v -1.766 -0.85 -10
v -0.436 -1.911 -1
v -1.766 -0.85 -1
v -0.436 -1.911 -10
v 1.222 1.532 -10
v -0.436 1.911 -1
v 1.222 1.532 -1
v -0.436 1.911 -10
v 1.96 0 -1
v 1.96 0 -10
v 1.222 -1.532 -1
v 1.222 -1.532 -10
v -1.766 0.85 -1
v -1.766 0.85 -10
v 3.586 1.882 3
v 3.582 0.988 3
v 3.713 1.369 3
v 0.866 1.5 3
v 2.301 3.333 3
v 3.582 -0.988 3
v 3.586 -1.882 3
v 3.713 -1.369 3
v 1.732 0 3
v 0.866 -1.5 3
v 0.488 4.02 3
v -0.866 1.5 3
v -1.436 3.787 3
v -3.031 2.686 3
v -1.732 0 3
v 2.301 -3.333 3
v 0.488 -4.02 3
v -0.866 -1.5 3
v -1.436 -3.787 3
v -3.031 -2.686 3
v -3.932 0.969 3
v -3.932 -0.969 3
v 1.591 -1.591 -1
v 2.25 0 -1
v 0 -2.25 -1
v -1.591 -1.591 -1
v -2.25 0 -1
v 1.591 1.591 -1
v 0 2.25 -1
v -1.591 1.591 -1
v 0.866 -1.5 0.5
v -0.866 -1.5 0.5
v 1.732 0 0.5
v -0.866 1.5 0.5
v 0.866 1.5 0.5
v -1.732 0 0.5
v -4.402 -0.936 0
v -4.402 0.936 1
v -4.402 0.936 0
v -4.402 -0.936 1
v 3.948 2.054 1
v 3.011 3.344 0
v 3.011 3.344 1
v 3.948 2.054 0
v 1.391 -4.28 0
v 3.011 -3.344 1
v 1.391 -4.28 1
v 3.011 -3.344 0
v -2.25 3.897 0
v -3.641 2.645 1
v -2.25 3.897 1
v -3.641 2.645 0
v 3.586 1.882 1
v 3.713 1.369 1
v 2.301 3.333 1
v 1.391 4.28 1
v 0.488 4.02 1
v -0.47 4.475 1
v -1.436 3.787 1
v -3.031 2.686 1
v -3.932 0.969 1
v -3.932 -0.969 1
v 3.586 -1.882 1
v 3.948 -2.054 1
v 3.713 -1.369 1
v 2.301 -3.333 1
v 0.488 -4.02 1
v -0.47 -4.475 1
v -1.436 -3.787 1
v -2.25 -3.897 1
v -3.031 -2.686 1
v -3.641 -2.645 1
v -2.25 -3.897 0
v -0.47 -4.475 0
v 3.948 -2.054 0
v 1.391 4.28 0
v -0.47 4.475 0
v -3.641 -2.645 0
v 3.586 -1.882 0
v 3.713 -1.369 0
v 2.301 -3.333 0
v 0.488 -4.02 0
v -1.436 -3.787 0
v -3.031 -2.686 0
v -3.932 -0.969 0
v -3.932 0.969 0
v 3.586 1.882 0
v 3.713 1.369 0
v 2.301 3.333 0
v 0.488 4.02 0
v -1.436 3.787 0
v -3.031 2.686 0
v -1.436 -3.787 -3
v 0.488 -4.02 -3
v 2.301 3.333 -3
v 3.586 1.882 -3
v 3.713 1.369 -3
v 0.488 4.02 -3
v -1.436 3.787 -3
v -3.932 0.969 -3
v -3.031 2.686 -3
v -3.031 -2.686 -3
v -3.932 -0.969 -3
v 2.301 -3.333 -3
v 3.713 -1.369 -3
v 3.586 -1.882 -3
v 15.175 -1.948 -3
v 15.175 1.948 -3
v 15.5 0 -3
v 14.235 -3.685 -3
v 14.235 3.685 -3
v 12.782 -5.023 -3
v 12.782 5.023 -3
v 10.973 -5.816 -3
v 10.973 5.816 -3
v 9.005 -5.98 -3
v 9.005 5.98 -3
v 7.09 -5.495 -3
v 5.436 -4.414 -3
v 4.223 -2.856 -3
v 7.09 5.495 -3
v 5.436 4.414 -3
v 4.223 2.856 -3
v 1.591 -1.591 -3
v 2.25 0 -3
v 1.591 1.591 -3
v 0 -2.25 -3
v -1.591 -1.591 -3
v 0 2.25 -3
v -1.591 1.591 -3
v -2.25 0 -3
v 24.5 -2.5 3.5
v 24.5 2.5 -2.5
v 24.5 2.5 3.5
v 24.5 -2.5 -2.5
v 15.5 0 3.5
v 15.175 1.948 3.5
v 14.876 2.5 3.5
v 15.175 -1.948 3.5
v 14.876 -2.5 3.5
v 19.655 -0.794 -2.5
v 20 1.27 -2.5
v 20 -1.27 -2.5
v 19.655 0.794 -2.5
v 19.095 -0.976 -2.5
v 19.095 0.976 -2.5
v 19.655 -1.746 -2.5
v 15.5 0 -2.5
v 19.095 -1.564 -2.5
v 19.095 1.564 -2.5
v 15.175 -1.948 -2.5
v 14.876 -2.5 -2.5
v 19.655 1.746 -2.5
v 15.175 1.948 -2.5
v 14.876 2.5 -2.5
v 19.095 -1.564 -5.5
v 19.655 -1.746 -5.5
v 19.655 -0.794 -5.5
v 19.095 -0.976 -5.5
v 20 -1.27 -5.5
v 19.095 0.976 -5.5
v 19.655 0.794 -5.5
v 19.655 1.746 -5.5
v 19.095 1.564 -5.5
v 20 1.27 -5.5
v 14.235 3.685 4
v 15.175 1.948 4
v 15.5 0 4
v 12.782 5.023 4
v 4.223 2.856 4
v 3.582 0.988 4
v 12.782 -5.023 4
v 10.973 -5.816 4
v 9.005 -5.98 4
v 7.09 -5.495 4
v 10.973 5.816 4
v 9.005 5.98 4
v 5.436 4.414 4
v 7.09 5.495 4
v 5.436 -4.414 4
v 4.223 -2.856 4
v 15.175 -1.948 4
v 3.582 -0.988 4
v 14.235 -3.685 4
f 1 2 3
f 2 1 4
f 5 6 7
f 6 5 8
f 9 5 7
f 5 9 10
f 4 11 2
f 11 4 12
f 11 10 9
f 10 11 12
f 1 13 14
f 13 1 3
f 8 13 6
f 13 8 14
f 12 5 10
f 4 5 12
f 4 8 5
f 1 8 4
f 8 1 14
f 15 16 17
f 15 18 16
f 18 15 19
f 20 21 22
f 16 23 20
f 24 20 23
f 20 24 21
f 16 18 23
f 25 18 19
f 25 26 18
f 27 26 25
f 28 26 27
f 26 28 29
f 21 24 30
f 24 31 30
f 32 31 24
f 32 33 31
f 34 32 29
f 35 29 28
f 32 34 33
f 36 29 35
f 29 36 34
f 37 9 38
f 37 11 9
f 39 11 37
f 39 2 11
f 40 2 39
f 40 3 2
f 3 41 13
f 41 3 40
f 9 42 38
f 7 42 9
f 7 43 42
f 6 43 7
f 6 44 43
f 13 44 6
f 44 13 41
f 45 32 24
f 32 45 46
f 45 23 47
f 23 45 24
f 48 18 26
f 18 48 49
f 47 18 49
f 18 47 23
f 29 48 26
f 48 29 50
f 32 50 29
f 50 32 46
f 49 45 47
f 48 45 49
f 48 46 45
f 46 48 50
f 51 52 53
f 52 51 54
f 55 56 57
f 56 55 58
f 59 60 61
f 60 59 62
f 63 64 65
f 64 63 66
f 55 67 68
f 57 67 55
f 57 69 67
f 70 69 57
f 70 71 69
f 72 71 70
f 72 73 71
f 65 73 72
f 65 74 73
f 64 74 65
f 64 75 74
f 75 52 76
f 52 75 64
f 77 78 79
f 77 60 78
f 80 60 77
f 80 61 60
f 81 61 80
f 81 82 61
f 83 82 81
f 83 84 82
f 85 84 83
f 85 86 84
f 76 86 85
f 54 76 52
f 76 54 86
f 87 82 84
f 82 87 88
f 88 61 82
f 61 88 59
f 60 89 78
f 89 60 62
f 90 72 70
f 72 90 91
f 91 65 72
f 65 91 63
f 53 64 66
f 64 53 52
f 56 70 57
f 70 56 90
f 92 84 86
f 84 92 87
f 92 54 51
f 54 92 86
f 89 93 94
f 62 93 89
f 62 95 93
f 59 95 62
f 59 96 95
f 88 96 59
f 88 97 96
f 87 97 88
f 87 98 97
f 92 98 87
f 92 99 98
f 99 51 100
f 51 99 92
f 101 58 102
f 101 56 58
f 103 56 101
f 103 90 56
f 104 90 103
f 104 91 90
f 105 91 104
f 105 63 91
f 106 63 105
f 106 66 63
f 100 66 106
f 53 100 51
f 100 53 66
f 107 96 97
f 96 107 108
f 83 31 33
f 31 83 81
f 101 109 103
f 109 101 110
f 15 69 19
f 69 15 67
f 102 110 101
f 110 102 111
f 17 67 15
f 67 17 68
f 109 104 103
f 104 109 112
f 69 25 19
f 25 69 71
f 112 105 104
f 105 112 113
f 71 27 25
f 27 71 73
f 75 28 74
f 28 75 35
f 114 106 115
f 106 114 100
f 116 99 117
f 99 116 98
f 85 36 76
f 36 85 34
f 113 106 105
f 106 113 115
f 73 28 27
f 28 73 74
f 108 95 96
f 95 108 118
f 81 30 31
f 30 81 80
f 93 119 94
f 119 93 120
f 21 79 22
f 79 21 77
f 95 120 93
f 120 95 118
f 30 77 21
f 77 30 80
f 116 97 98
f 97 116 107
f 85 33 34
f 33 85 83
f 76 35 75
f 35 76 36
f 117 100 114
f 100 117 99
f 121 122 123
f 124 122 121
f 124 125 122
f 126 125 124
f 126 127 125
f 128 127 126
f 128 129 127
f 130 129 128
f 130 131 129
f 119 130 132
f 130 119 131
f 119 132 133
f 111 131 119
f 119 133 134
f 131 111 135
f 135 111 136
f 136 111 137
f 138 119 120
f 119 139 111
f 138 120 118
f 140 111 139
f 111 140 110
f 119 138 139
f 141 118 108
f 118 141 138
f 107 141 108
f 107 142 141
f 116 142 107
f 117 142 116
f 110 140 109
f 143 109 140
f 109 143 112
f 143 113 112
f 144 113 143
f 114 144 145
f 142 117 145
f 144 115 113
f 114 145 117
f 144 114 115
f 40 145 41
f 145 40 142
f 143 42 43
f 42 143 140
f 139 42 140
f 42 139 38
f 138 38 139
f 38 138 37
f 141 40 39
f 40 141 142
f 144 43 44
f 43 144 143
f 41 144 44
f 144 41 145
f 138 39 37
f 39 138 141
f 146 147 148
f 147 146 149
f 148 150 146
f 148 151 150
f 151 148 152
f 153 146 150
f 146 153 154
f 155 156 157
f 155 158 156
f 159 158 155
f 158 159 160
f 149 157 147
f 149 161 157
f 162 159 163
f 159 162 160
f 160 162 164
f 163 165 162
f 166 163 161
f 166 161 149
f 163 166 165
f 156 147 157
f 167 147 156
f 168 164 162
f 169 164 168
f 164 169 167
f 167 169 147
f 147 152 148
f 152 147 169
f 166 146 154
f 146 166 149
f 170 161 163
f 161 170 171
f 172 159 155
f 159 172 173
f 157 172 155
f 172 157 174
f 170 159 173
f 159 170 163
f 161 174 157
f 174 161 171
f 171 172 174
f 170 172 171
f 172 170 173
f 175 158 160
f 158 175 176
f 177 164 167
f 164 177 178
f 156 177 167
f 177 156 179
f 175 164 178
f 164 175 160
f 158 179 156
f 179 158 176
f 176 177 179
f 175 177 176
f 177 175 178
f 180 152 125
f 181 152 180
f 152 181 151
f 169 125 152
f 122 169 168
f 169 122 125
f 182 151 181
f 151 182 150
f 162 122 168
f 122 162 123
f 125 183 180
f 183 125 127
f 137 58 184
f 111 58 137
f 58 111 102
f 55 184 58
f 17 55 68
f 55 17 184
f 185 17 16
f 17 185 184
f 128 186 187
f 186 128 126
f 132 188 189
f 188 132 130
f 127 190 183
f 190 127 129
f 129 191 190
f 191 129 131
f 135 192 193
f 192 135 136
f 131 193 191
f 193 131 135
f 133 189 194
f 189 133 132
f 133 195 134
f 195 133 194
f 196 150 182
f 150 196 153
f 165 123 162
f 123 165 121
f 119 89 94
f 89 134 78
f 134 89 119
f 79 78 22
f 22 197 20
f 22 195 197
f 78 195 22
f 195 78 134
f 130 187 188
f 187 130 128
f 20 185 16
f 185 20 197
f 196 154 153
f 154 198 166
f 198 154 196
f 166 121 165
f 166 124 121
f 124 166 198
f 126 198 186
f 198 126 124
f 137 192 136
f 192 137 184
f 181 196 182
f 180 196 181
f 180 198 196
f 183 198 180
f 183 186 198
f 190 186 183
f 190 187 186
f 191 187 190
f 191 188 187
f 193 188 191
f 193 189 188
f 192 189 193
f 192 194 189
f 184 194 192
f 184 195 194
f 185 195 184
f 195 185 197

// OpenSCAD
// Parameters
shank_diameter_mm = 4; //[2:8:0.1]
length_under_head_mm = 10; //[5:20:0.5]
head_diameter_mm = 7; //[3.5:14:0.1]
head_height_mm = 4; //[2:8:0.1]
hex_socket_af_mm = 3; //[1.5:6:0.1]
hex_socket_depth_mm = 2.5; //[1:4:0.1]
thread_representation_diameter_factor = 0.98; //[0.9:1:0.01]
washer_outer_diameter_mm = 9; //[4.5:18:0.1]
washer_thickness_mm = 1; //[0.5:2:0.1]
pcb_spacer_height_mm = 6; //[3:12:0.5]
pcb_spacer_wall_mm = 1.8; //[0.9:3.6:0.1]
screw_clearance_diameter_mm = 4.5; //[4.1:5.5:0.1]
buzzer_body_diameter_mm = 12; //[6:24:0.5]
buzzer_body_height_mm = 7; //[3.5:14:0.5]
pin_socket_body_width_mm = 10; //[5:20:0.5]
pin_socket_body_depth_mm = 5; //[2.5:10:0.5]
pin_socket_body_height_mm = 6; //[3:12:0.5]
pin_socket_pin_diameter_mm = 1; //[0.5:2:0.1]
pin_socket_pin_length_mm = 4; //[2:8:0.5]
pin_socket_pin_spacing_mm = 2.54; //[2:5.08:0.01]
overlap_mm = 1; //[0.5:2:0.1]

// PCB Spacer - complete geometry
module pcb_spacer() {
  color("Silver") {
    difference() {
      cylinder(r=screw_clearance_diameter_mm/2 + pcb_spacer_wall_mm, h=pcb_spacer_height_mm, center=true);
      translate([0, 0, -overlap_mm])
        cylinder(r=screw_clearance_diameter_mm/2, h=pcb_spacer_height_mm + 2*overlap_mm, center=true);
    }
  }
}

// Screw and Washer - complete geometry
module screw_and_washer() {
  color("DimGray") {
    union() {
      // Screw
      difference() {
        union() {
          translate([0, 0, -length_under_head_mm/2])
            cylinder(r=shank_diameter_mm*thread_representation_diameter_factor/2, h=length_under_head_mm, center=true);
          translate([0, 0, head_height_mm/2 - overlap_mm])
            cylinder(r=head_diameter_mm/2, h=head_height_mm, center=true);
        }
        translate([0, 0, head_height_mm - hex_socket_depth_mm/2 - overlap_mm])
          cylinder(r=hex_socket_af_mm/(2*cos(30)), h=hex_socket_depth_mm, center=true);
      }
      // Washer
      difference() {
        translate([0, 0, -washer_thickness_mm/2 + overlap_mm])
          cylinder(r=washer_outer_diameter_mm/2, h=washer_thickness_mm, center=true);
        translate([0, 0, -washer_thickness_mm/2 + overlap_mm])
          cylinder(r=screw_clearance_diameter_mm/2, h=washer_thickness_mm + 2*overlap_mm, center=true);
      }
    }
  }
}

// Buzzer - complete geometry
module buzzer() {
  color("Black") {
    translate([washer_outer_diameter_mm/2 + buzzer_body_diameter_mm/2 - overlap_mm, 0, -washer_thickness_mm/2 + overlap_mm])
      cylinder(r=buzzer_body_diameter_mm/2, h=buzzer_body_height_mm, center=true);
  }
}

// Pin Socket - complete geometry
module pin_socket() {
  color("Blue") {
    union() {
      // Body
      translate([washer_outer_diameter_mm/2 + buzzer_body_diameter_mm + pin_socket_body_width_mm/2 - 2*overlap_mm, 0, -washer_thickness_mm/2 + overlap_mm])
        cube([pin_socket_body_width_mm, pin_socket_body_depth_mm, pin_socket_body_height_mm], center=true);
      // Pins
      translate([washer_outer_diameter_mm/2 + buzzer_body_diameter_mm + pin_socket_body_width_mm/2 - 2*overlap_mm, -pin_socket_pin_spacing_mm/2, -washer_thickness_mm/2 - pin_socket_body_height_mm/2 - pin_socket_pin_length_mm/2 + 2*overlap_mm])
        cylinder(r=pin_socket_pin_diameter_mm/2, h=pin_socket_pin_length_mm, center=true);
      translate([washer_outer_diameter_mm/2 + buzzer_body_diameter_mm + pin_socket_body_width_mm/2 - 2*overlap_mm, pin_socket_pin_spacing_mm/2, -washer_thickness_mm/2 - pin_socket_body_height_mm/2 - pin_socket_pin_length_mm/2 + 2*overlap_mm])
        cylinder(r=pin_socket_pin_diameter_mm/2, h=pin_socket_pin_length_mm, center=true);
    }
  }
}

// Assembly
module assembly() {
  screw_and_washer();
  pcb_spacer();
  buzzer();
  pin_socket();
}

assembly();
